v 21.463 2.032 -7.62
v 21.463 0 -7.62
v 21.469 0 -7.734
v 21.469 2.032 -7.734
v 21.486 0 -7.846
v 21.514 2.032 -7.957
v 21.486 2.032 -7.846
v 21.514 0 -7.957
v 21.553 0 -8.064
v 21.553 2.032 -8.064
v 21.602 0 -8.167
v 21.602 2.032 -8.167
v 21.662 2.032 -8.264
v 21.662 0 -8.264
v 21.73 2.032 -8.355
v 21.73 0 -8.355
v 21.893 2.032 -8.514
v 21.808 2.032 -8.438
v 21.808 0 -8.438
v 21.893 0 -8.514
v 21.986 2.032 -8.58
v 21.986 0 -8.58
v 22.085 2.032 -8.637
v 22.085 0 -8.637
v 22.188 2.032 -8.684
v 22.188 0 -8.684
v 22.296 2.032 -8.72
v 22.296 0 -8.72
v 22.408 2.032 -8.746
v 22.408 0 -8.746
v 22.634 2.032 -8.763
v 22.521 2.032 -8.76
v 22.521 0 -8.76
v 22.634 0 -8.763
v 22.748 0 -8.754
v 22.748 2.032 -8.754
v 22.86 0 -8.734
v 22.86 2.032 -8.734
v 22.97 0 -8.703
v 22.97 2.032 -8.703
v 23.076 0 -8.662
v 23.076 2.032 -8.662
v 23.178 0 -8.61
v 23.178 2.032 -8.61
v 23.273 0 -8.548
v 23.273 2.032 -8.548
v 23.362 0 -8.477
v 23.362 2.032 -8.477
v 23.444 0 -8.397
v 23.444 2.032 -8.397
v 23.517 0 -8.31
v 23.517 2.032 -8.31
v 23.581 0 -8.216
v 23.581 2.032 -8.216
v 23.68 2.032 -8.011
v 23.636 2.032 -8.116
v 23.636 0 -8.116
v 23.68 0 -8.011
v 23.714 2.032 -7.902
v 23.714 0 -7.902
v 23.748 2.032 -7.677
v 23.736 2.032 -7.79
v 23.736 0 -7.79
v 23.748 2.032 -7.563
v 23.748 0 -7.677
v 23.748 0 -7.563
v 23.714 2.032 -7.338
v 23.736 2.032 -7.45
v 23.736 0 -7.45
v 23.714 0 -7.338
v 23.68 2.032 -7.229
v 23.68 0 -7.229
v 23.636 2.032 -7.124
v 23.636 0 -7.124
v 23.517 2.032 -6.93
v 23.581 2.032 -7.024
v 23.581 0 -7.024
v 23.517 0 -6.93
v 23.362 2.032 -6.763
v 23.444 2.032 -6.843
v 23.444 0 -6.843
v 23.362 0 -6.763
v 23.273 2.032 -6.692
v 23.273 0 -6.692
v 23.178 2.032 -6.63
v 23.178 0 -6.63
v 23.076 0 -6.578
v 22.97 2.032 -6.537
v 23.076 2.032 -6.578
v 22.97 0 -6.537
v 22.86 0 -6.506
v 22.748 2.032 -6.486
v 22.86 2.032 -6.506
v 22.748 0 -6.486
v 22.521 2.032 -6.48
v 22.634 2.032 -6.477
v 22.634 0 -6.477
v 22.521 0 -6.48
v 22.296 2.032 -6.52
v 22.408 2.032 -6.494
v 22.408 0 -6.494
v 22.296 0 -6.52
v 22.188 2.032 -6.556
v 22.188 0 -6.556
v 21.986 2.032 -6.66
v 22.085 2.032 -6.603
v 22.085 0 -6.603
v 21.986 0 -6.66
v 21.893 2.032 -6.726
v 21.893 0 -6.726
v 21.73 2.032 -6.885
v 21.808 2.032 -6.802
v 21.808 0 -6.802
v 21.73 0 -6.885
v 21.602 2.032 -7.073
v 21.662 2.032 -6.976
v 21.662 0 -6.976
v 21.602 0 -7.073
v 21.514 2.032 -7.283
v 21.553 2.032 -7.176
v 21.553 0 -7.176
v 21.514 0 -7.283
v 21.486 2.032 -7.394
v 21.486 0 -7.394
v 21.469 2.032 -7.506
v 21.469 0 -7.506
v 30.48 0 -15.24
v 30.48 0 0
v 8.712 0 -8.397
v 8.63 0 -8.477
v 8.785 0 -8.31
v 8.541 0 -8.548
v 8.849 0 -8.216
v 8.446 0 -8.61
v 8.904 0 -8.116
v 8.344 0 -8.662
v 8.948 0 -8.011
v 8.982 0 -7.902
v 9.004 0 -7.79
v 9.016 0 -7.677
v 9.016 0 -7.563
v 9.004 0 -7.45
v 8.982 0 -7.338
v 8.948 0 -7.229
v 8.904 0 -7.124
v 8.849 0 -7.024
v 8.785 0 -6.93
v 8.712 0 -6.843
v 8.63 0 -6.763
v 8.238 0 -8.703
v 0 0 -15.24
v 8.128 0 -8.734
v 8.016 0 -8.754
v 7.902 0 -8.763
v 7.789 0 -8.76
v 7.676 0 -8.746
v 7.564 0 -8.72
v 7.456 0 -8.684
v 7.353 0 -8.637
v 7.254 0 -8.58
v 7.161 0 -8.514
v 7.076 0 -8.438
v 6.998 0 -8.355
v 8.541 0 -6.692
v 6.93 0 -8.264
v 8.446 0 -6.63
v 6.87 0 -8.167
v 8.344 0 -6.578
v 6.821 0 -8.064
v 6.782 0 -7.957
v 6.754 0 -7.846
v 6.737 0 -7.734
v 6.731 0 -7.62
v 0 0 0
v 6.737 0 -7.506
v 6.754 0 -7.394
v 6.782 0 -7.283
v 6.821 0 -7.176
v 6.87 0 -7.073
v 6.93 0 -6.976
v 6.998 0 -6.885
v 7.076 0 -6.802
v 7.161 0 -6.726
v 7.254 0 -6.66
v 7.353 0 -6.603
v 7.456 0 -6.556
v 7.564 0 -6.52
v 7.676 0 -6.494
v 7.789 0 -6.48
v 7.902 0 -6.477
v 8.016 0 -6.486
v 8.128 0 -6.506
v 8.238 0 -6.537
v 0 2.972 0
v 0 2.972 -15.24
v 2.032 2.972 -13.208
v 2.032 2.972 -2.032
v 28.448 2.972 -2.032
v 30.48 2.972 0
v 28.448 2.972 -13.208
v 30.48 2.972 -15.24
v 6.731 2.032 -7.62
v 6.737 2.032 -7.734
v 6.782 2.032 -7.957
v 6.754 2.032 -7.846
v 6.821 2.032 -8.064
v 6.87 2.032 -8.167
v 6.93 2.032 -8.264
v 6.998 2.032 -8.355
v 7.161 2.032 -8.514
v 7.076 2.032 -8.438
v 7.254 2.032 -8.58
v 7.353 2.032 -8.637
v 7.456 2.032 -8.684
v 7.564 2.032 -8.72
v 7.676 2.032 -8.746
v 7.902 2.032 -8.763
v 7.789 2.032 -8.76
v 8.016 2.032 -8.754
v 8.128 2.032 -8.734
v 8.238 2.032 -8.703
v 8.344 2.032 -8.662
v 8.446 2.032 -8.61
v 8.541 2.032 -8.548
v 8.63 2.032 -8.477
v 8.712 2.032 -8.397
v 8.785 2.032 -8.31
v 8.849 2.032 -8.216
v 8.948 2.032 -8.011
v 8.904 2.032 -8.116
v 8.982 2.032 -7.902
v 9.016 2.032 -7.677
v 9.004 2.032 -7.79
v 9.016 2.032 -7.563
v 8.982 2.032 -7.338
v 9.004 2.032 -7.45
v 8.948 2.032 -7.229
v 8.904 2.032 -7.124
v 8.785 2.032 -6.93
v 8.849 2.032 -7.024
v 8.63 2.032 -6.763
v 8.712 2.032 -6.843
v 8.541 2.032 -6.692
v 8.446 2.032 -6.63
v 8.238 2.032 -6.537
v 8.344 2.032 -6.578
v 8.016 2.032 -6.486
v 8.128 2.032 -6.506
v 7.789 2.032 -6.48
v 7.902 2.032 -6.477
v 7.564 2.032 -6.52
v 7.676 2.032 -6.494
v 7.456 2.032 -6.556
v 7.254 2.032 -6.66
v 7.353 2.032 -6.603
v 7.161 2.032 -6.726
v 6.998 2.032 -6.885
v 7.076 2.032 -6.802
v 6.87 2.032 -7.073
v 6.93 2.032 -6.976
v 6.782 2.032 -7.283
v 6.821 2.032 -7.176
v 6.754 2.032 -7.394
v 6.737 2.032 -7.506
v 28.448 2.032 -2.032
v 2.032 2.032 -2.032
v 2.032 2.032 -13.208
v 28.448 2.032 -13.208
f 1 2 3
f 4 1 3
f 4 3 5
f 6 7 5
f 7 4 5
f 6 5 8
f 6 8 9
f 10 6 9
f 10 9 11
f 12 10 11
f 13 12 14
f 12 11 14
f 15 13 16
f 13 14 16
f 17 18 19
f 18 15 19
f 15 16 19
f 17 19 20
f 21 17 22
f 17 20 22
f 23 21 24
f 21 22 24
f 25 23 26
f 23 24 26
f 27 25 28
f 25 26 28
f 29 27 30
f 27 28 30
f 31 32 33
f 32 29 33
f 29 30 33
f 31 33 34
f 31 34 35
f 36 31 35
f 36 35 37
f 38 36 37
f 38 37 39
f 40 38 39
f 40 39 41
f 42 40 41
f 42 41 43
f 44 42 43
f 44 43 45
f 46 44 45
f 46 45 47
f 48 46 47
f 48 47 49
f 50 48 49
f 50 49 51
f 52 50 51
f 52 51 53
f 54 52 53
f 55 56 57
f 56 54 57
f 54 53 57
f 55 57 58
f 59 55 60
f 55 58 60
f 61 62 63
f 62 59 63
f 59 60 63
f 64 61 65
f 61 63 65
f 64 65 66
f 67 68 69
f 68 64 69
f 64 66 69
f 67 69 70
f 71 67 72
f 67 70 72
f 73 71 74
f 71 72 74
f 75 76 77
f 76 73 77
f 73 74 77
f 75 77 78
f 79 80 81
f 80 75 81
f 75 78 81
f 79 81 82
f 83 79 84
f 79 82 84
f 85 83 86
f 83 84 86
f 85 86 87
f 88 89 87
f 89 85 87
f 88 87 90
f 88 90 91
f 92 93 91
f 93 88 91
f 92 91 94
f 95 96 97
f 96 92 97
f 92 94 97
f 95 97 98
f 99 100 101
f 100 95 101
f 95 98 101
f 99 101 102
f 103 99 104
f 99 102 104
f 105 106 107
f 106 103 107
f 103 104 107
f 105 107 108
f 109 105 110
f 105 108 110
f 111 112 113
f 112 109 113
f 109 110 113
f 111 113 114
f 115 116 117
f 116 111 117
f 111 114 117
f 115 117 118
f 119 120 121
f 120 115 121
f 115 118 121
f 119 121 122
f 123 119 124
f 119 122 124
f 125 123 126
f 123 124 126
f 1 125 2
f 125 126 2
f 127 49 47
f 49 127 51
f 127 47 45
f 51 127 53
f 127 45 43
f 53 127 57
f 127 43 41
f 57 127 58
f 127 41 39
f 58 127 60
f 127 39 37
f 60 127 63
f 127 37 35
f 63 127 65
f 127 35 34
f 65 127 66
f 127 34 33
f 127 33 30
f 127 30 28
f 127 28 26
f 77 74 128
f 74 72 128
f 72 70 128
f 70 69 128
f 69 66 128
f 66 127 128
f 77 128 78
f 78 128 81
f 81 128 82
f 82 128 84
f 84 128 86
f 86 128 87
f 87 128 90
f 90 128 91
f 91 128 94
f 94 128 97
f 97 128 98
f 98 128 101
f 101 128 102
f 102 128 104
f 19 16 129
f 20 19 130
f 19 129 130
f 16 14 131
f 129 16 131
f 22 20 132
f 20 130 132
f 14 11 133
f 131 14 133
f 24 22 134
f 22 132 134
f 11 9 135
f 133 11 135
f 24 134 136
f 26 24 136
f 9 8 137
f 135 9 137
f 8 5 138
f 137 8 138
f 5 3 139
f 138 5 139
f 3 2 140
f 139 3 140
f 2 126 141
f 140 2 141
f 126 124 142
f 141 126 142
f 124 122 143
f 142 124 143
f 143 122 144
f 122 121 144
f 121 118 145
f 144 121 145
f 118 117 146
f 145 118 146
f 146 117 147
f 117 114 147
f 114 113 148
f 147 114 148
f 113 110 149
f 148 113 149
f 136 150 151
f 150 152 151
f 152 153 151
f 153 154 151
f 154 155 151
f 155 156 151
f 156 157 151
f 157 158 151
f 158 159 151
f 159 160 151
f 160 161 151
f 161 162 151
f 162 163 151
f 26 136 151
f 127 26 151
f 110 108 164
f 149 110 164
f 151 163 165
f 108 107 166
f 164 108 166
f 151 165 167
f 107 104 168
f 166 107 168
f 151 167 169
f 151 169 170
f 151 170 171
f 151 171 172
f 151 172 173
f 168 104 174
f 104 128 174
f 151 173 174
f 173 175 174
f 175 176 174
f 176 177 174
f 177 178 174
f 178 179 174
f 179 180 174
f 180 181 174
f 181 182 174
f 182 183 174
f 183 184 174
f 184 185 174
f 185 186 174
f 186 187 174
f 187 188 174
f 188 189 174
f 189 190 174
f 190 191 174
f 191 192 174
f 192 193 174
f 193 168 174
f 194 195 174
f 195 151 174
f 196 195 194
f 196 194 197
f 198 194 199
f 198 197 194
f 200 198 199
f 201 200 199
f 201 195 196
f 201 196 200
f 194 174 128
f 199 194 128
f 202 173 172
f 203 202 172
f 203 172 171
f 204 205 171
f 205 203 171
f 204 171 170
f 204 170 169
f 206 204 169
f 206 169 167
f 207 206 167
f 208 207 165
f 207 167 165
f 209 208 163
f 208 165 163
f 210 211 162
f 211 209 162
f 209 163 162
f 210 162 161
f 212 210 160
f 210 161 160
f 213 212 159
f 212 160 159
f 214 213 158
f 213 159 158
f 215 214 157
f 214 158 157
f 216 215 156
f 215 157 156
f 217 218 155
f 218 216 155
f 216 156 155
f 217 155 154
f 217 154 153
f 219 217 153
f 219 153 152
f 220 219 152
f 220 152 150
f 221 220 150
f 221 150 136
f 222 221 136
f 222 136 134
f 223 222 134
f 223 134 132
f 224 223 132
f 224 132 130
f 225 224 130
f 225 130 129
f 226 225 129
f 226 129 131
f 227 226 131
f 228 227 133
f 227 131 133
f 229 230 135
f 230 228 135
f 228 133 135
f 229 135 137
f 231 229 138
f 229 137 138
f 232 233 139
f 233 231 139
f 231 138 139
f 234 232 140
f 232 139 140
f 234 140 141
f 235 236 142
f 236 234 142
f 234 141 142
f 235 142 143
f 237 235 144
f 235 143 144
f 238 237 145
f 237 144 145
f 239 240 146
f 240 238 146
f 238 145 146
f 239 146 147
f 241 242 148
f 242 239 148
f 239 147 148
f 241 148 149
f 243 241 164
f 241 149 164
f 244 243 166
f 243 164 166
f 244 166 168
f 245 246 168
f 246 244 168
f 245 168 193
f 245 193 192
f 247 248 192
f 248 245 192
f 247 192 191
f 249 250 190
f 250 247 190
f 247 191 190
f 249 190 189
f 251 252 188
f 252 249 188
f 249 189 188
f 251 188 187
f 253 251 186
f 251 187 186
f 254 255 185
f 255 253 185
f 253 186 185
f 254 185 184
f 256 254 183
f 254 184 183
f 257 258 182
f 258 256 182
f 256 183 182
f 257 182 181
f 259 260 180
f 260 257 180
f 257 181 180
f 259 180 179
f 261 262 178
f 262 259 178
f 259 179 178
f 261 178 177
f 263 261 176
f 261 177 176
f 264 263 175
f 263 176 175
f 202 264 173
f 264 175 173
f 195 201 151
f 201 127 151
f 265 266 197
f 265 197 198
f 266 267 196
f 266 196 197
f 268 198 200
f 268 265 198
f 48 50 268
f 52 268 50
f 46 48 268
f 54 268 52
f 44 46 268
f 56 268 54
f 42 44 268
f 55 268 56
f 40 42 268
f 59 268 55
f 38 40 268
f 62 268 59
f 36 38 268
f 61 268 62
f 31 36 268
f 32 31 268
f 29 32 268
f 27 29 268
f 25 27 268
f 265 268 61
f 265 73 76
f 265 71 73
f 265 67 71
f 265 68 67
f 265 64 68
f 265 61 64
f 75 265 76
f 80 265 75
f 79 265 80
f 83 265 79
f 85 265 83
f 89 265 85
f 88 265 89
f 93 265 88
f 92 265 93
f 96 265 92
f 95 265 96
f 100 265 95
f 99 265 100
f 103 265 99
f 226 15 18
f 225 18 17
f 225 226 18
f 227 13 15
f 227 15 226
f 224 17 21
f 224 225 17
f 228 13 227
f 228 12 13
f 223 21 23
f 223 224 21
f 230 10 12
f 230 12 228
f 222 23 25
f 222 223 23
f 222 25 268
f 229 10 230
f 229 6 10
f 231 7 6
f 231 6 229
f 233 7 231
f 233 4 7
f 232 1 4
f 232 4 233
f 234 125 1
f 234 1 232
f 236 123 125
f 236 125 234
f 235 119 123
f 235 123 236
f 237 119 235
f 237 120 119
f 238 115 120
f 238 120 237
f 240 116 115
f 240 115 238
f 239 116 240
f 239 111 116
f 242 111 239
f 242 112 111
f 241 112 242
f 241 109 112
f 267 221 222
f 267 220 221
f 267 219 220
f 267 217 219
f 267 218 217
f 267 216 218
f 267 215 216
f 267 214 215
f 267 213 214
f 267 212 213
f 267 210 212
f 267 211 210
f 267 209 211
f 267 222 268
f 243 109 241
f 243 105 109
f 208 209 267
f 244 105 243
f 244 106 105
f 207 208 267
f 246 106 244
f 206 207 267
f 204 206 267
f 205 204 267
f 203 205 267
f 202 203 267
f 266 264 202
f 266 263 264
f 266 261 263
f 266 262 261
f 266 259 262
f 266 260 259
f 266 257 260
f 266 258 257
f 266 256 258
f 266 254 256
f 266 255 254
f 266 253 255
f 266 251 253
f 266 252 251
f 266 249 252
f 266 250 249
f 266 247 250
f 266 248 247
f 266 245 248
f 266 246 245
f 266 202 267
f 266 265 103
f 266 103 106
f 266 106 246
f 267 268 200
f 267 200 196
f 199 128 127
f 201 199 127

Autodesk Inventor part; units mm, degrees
ref_plane "YZ Plane" through (0, 0, 0) normal (1, 0, 0) x (0, 1, 0)
ref_plane "XZ Plane" through (0, 0, 0) normal (0, 1, 0) x (-1, 0, 0)
ref_plane "XY Plane" through (0, 0, 0) normal (0, 0, 1) x (1, 0, 0)
sketch "Sketch1" plane through (0, 0, 0) normal (0, 1, 0) x (-1, 0, 0)
  line L0 (0, 0) -> (-30.48, 0)
  line L1 (-30.48, 0) -> (-30.48, -15.24)
  line L2 (-30.48, -15.24) -> (0, -15.24)
  line L3 (0, -15.24) -> (0, 0)
  line L4 (0, -7.62) -> (-30.48, -7.62) construction
  circle A0 centre (-7.874, -7.62) radius 1.143
  circle A1 centre (-22.606, -7.62) radius 1.143
  dimension "d0" = 15.24
  dimension "d1" = 30.48
  dimension "d2" = 2.286
  dimension "d3" = 2.286
  dimension "d4" = 14.732
  dimension "d5" = 7.874
extrude "Extrusion1" add sketch "Sketch1" along normal blind 2.032
sketch "Sketch2" plane through (0, 2.032, 0) normal (0, 1, 0) x (1, 0, 0)
  line L0 (0, 0) -> (30.48, 0)
  line L1 (30.48, 0) -> (30.48, 15.24)
  line L2 (30.48, 15.24) -> (0, 15.24)
  line L3 (0, 15.24) -> (0, 0)
  line L4 (2.032, 2.032) -> (28.448, 2.032)
  line L5 (28.448, 2.032) -> (28.448, 13.208)
  line L6 (28.448, 13.208) -> (2.032, 13.208)
  line L7 (2.032, 13.208) -> (2.032, 2.032)
  dimension "d8" = 2.032
  dimension "d9" = 2.032
  dimension "d10" = 2.032
  dimension "d12" = 2.032
extrude "Extrusion2" add sketch "Sketch2" along normal blind 0.9398
properties part number "castor_bracket"
